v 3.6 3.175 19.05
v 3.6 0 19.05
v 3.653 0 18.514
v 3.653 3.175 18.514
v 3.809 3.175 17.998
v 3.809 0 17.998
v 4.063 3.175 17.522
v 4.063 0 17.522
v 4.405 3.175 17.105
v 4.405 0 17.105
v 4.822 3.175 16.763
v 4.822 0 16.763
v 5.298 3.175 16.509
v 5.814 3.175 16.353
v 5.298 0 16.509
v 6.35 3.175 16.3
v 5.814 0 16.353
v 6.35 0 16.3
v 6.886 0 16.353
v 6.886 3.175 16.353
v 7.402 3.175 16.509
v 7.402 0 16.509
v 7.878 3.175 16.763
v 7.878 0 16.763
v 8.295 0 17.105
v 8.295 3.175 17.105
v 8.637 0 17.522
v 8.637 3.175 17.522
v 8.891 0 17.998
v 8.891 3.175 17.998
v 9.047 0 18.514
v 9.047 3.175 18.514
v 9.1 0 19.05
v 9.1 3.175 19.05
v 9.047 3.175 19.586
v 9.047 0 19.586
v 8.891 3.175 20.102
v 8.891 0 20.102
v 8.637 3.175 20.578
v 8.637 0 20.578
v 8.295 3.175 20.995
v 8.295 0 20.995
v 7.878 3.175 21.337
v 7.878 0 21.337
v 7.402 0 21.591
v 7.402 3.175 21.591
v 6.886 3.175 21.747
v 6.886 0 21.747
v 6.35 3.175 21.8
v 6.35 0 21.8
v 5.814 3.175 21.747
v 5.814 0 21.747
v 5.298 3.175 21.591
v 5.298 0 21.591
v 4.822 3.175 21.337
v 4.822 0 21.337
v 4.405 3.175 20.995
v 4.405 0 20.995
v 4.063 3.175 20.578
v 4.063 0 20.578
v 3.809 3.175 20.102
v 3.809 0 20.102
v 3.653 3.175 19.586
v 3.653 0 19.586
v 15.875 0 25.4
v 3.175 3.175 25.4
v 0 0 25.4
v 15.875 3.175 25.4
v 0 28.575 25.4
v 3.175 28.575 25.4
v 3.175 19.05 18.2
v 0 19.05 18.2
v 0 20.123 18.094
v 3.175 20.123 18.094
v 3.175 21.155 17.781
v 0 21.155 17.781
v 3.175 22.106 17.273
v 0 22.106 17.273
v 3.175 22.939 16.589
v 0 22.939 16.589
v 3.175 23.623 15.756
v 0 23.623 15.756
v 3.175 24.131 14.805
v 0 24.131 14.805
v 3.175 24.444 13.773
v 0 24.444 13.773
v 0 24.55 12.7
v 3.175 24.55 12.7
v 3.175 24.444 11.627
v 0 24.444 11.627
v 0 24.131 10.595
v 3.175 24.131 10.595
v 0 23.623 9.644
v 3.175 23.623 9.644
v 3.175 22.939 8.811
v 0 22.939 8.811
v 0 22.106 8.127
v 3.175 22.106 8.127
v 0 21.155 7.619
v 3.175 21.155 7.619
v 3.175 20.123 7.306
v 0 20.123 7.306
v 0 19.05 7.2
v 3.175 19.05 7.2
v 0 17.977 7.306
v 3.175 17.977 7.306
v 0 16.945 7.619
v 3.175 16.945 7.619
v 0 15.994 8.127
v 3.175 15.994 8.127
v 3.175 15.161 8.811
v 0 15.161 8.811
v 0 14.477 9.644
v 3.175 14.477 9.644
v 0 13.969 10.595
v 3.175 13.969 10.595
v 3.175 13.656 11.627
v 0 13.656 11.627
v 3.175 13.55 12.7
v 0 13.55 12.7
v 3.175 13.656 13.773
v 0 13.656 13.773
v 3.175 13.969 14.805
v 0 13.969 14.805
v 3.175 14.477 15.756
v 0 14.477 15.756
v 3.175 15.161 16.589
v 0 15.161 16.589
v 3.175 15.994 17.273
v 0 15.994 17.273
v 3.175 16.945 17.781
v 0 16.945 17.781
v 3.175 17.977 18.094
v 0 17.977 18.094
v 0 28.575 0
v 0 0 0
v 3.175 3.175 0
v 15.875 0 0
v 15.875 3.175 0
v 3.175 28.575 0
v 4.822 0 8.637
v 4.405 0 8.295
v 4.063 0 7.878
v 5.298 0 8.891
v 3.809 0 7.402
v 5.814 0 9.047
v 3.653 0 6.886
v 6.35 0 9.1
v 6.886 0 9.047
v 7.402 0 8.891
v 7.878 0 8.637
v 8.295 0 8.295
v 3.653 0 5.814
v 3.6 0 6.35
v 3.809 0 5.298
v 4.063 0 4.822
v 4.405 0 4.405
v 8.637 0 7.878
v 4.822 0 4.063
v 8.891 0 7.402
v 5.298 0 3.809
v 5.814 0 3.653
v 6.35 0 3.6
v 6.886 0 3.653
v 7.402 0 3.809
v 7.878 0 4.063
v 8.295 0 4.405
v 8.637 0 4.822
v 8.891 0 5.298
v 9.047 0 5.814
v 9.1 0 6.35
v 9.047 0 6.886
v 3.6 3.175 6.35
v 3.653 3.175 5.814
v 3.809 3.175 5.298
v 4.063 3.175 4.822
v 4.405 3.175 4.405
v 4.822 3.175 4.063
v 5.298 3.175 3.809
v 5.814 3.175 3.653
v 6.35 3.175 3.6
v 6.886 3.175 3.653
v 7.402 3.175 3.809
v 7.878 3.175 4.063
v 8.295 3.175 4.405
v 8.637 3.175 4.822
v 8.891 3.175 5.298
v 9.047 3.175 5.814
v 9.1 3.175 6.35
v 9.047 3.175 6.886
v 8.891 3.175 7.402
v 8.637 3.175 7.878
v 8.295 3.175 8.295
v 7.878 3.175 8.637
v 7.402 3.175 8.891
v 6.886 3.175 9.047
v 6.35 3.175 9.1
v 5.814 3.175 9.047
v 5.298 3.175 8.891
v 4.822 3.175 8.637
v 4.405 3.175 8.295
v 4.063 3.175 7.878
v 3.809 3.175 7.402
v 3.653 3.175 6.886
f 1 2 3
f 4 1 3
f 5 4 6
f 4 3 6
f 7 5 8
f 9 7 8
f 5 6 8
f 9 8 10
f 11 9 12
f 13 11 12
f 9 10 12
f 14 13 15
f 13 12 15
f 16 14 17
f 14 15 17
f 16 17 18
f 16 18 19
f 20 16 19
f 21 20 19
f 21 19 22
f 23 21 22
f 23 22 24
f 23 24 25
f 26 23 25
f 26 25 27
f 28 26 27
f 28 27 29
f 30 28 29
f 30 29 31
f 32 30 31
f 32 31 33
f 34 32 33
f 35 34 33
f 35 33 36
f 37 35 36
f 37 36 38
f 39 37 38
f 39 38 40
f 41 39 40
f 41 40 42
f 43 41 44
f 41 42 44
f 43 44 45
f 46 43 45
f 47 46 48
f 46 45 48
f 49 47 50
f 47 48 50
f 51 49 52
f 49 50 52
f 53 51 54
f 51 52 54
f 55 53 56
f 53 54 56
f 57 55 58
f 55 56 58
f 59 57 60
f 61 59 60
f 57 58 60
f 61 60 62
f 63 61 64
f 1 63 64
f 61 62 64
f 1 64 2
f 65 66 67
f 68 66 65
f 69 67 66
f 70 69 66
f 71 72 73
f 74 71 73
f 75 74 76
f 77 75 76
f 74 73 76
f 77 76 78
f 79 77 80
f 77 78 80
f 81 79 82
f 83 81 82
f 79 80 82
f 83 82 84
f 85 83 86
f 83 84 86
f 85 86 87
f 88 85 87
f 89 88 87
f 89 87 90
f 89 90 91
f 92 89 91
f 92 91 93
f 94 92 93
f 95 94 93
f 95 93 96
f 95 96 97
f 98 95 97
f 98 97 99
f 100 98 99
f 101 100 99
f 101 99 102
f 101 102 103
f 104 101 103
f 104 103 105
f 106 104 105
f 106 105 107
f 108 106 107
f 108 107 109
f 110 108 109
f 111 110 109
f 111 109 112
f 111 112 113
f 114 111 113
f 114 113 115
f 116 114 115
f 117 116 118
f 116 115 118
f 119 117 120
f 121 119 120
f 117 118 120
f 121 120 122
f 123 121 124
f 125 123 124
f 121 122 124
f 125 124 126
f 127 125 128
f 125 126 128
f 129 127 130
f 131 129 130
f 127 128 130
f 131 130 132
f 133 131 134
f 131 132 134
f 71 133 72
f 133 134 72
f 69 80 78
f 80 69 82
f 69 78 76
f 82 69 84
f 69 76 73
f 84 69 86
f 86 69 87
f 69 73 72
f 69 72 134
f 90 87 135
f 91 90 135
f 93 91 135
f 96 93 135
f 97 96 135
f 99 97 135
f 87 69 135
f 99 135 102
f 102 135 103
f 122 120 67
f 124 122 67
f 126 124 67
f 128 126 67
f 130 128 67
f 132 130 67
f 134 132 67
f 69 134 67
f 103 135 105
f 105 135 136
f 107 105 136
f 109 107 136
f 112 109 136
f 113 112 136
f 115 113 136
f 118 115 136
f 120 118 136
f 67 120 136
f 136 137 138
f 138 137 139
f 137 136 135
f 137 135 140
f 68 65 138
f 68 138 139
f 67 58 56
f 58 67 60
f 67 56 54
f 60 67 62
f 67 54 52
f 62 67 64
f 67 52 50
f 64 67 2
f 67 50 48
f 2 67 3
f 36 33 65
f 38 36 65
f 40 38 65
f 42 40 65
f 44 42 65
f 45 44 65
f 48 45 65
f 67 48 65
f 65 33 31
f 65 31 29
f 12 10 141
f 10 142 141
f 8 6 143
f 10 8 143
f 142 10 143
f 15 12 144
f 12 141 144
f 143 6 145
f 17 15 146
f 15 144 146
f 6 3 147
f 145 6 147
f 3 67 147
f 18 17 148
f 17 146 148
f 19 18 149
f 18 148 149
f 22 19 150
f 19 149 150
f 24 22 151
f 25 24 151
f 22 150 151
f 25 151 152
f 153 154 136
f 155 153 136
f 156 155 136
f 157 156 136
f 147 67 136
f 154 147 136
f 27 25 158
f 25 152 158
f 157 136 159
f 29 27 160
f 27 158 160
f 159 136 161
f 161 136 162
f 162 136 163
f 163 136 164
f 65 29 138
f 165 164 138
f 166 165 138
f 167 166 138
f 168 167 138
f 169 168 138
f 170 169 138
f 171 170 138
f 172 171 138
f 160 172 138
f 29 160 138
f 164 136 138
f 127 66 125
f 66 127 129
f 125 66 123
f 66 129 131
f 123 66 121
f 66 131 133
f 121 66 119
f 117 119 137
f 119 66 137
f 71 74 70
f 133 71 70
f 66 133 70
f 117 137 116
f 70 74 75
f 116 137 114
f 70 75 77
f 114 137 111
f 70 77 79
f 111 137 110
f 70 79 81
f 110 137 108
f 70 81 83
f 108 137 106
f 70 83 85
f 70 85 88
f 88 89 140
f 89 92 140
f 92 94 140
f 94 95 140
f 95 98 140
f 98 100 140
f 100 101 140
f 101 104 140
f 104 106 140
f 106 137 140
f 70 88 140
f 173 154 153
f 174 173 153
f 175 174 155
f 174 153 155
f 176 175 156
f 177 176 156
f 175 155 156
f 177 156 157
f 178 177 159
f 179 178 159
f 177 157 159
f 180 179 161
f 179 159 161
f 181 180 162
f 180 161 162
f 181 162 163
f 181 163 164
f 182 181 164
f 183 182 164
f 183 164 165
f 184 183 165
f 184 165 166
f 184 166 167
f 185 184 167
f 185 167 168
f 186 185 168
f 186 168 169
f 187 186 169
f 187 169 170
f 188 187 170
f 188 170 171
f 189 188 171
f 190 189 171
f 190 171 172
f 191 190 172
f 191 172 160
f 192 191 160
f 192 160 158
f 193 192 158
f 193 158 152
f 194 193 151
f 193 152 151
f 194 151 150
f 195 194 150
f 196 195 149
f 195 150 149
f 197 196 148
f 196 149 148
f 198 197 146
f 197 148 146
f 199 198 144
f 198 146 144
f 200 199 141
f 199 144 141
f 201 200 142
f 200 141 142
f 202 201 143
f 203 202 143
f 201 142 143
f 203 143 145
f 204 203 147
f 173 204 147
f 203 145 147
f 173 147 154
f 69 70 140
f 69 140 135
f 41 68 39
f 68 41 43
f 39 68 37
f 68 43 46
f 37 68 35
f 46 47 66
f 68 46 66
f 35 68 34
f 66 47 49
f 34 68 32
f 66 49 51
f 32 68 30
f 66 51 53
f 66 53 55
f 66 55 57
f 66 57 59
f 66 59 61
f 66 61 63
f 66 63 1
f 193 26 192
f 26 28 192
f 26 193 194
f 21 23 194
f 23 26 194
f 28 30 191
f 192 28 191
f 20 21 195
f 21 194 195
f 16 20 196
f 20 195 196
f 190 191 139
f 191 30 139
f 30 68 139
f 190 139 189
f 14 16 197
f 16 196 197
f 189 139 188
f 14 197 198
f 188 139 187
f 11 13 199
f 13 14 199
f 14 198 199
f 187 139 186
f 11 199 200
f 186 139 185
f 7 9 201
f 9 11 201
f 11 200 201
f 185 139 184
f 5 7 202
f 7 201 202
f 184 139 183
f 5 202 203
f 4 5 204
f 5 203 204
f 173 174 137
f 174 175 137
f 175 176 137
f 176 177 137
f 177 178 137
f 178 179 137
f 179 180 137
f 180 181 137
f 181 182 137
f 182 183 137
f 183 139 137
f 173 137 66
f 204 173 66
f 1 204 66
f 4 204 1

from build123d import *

# Parameters (mm, degrees)
BOSS_EXTRUDE1_DEPTH   = 25.4
M10_CLEARANCE_HOLE1_D = 11
M5_CLEARANCE_HOLE2_D  = 5.5


with BuildPart() as part:
    # Sketch1 → Boss-Extrude1 (new body)
    with BuildSketch(Plane.XY):
        Polygon((0, 0), (15.875, 0), (15.875, 3.175), (3.175, 3.175), (3.175, 28.575), (0, 28.575), align=None)
    extrude(amount=BOSS_EXTRUDE1_DEPTH)

    # M10 Clearance Hole1 (through all)
    with Locations(Plane(origin=(3.175, 0, 0), x_dir=(0, 0, -1), z_dir=(1, 0, 0))):
        with Locations((-12.7, 19.05)):
            Hole(M10_CLEARANCE_HOLE1_D / 2)

    # M5 Clearance Hole2 (through all)
    with Locations(Plane(origin=(0, 3.175, 0), x_dir=(1, 0, 0), z_dir=(0, 1, 0))):
        with Locations((6.35, -19.05), (6.35, -6.35)):
            Hole(M5_CLEARANCE_HOLE2_D / 2)


solid = part.part
